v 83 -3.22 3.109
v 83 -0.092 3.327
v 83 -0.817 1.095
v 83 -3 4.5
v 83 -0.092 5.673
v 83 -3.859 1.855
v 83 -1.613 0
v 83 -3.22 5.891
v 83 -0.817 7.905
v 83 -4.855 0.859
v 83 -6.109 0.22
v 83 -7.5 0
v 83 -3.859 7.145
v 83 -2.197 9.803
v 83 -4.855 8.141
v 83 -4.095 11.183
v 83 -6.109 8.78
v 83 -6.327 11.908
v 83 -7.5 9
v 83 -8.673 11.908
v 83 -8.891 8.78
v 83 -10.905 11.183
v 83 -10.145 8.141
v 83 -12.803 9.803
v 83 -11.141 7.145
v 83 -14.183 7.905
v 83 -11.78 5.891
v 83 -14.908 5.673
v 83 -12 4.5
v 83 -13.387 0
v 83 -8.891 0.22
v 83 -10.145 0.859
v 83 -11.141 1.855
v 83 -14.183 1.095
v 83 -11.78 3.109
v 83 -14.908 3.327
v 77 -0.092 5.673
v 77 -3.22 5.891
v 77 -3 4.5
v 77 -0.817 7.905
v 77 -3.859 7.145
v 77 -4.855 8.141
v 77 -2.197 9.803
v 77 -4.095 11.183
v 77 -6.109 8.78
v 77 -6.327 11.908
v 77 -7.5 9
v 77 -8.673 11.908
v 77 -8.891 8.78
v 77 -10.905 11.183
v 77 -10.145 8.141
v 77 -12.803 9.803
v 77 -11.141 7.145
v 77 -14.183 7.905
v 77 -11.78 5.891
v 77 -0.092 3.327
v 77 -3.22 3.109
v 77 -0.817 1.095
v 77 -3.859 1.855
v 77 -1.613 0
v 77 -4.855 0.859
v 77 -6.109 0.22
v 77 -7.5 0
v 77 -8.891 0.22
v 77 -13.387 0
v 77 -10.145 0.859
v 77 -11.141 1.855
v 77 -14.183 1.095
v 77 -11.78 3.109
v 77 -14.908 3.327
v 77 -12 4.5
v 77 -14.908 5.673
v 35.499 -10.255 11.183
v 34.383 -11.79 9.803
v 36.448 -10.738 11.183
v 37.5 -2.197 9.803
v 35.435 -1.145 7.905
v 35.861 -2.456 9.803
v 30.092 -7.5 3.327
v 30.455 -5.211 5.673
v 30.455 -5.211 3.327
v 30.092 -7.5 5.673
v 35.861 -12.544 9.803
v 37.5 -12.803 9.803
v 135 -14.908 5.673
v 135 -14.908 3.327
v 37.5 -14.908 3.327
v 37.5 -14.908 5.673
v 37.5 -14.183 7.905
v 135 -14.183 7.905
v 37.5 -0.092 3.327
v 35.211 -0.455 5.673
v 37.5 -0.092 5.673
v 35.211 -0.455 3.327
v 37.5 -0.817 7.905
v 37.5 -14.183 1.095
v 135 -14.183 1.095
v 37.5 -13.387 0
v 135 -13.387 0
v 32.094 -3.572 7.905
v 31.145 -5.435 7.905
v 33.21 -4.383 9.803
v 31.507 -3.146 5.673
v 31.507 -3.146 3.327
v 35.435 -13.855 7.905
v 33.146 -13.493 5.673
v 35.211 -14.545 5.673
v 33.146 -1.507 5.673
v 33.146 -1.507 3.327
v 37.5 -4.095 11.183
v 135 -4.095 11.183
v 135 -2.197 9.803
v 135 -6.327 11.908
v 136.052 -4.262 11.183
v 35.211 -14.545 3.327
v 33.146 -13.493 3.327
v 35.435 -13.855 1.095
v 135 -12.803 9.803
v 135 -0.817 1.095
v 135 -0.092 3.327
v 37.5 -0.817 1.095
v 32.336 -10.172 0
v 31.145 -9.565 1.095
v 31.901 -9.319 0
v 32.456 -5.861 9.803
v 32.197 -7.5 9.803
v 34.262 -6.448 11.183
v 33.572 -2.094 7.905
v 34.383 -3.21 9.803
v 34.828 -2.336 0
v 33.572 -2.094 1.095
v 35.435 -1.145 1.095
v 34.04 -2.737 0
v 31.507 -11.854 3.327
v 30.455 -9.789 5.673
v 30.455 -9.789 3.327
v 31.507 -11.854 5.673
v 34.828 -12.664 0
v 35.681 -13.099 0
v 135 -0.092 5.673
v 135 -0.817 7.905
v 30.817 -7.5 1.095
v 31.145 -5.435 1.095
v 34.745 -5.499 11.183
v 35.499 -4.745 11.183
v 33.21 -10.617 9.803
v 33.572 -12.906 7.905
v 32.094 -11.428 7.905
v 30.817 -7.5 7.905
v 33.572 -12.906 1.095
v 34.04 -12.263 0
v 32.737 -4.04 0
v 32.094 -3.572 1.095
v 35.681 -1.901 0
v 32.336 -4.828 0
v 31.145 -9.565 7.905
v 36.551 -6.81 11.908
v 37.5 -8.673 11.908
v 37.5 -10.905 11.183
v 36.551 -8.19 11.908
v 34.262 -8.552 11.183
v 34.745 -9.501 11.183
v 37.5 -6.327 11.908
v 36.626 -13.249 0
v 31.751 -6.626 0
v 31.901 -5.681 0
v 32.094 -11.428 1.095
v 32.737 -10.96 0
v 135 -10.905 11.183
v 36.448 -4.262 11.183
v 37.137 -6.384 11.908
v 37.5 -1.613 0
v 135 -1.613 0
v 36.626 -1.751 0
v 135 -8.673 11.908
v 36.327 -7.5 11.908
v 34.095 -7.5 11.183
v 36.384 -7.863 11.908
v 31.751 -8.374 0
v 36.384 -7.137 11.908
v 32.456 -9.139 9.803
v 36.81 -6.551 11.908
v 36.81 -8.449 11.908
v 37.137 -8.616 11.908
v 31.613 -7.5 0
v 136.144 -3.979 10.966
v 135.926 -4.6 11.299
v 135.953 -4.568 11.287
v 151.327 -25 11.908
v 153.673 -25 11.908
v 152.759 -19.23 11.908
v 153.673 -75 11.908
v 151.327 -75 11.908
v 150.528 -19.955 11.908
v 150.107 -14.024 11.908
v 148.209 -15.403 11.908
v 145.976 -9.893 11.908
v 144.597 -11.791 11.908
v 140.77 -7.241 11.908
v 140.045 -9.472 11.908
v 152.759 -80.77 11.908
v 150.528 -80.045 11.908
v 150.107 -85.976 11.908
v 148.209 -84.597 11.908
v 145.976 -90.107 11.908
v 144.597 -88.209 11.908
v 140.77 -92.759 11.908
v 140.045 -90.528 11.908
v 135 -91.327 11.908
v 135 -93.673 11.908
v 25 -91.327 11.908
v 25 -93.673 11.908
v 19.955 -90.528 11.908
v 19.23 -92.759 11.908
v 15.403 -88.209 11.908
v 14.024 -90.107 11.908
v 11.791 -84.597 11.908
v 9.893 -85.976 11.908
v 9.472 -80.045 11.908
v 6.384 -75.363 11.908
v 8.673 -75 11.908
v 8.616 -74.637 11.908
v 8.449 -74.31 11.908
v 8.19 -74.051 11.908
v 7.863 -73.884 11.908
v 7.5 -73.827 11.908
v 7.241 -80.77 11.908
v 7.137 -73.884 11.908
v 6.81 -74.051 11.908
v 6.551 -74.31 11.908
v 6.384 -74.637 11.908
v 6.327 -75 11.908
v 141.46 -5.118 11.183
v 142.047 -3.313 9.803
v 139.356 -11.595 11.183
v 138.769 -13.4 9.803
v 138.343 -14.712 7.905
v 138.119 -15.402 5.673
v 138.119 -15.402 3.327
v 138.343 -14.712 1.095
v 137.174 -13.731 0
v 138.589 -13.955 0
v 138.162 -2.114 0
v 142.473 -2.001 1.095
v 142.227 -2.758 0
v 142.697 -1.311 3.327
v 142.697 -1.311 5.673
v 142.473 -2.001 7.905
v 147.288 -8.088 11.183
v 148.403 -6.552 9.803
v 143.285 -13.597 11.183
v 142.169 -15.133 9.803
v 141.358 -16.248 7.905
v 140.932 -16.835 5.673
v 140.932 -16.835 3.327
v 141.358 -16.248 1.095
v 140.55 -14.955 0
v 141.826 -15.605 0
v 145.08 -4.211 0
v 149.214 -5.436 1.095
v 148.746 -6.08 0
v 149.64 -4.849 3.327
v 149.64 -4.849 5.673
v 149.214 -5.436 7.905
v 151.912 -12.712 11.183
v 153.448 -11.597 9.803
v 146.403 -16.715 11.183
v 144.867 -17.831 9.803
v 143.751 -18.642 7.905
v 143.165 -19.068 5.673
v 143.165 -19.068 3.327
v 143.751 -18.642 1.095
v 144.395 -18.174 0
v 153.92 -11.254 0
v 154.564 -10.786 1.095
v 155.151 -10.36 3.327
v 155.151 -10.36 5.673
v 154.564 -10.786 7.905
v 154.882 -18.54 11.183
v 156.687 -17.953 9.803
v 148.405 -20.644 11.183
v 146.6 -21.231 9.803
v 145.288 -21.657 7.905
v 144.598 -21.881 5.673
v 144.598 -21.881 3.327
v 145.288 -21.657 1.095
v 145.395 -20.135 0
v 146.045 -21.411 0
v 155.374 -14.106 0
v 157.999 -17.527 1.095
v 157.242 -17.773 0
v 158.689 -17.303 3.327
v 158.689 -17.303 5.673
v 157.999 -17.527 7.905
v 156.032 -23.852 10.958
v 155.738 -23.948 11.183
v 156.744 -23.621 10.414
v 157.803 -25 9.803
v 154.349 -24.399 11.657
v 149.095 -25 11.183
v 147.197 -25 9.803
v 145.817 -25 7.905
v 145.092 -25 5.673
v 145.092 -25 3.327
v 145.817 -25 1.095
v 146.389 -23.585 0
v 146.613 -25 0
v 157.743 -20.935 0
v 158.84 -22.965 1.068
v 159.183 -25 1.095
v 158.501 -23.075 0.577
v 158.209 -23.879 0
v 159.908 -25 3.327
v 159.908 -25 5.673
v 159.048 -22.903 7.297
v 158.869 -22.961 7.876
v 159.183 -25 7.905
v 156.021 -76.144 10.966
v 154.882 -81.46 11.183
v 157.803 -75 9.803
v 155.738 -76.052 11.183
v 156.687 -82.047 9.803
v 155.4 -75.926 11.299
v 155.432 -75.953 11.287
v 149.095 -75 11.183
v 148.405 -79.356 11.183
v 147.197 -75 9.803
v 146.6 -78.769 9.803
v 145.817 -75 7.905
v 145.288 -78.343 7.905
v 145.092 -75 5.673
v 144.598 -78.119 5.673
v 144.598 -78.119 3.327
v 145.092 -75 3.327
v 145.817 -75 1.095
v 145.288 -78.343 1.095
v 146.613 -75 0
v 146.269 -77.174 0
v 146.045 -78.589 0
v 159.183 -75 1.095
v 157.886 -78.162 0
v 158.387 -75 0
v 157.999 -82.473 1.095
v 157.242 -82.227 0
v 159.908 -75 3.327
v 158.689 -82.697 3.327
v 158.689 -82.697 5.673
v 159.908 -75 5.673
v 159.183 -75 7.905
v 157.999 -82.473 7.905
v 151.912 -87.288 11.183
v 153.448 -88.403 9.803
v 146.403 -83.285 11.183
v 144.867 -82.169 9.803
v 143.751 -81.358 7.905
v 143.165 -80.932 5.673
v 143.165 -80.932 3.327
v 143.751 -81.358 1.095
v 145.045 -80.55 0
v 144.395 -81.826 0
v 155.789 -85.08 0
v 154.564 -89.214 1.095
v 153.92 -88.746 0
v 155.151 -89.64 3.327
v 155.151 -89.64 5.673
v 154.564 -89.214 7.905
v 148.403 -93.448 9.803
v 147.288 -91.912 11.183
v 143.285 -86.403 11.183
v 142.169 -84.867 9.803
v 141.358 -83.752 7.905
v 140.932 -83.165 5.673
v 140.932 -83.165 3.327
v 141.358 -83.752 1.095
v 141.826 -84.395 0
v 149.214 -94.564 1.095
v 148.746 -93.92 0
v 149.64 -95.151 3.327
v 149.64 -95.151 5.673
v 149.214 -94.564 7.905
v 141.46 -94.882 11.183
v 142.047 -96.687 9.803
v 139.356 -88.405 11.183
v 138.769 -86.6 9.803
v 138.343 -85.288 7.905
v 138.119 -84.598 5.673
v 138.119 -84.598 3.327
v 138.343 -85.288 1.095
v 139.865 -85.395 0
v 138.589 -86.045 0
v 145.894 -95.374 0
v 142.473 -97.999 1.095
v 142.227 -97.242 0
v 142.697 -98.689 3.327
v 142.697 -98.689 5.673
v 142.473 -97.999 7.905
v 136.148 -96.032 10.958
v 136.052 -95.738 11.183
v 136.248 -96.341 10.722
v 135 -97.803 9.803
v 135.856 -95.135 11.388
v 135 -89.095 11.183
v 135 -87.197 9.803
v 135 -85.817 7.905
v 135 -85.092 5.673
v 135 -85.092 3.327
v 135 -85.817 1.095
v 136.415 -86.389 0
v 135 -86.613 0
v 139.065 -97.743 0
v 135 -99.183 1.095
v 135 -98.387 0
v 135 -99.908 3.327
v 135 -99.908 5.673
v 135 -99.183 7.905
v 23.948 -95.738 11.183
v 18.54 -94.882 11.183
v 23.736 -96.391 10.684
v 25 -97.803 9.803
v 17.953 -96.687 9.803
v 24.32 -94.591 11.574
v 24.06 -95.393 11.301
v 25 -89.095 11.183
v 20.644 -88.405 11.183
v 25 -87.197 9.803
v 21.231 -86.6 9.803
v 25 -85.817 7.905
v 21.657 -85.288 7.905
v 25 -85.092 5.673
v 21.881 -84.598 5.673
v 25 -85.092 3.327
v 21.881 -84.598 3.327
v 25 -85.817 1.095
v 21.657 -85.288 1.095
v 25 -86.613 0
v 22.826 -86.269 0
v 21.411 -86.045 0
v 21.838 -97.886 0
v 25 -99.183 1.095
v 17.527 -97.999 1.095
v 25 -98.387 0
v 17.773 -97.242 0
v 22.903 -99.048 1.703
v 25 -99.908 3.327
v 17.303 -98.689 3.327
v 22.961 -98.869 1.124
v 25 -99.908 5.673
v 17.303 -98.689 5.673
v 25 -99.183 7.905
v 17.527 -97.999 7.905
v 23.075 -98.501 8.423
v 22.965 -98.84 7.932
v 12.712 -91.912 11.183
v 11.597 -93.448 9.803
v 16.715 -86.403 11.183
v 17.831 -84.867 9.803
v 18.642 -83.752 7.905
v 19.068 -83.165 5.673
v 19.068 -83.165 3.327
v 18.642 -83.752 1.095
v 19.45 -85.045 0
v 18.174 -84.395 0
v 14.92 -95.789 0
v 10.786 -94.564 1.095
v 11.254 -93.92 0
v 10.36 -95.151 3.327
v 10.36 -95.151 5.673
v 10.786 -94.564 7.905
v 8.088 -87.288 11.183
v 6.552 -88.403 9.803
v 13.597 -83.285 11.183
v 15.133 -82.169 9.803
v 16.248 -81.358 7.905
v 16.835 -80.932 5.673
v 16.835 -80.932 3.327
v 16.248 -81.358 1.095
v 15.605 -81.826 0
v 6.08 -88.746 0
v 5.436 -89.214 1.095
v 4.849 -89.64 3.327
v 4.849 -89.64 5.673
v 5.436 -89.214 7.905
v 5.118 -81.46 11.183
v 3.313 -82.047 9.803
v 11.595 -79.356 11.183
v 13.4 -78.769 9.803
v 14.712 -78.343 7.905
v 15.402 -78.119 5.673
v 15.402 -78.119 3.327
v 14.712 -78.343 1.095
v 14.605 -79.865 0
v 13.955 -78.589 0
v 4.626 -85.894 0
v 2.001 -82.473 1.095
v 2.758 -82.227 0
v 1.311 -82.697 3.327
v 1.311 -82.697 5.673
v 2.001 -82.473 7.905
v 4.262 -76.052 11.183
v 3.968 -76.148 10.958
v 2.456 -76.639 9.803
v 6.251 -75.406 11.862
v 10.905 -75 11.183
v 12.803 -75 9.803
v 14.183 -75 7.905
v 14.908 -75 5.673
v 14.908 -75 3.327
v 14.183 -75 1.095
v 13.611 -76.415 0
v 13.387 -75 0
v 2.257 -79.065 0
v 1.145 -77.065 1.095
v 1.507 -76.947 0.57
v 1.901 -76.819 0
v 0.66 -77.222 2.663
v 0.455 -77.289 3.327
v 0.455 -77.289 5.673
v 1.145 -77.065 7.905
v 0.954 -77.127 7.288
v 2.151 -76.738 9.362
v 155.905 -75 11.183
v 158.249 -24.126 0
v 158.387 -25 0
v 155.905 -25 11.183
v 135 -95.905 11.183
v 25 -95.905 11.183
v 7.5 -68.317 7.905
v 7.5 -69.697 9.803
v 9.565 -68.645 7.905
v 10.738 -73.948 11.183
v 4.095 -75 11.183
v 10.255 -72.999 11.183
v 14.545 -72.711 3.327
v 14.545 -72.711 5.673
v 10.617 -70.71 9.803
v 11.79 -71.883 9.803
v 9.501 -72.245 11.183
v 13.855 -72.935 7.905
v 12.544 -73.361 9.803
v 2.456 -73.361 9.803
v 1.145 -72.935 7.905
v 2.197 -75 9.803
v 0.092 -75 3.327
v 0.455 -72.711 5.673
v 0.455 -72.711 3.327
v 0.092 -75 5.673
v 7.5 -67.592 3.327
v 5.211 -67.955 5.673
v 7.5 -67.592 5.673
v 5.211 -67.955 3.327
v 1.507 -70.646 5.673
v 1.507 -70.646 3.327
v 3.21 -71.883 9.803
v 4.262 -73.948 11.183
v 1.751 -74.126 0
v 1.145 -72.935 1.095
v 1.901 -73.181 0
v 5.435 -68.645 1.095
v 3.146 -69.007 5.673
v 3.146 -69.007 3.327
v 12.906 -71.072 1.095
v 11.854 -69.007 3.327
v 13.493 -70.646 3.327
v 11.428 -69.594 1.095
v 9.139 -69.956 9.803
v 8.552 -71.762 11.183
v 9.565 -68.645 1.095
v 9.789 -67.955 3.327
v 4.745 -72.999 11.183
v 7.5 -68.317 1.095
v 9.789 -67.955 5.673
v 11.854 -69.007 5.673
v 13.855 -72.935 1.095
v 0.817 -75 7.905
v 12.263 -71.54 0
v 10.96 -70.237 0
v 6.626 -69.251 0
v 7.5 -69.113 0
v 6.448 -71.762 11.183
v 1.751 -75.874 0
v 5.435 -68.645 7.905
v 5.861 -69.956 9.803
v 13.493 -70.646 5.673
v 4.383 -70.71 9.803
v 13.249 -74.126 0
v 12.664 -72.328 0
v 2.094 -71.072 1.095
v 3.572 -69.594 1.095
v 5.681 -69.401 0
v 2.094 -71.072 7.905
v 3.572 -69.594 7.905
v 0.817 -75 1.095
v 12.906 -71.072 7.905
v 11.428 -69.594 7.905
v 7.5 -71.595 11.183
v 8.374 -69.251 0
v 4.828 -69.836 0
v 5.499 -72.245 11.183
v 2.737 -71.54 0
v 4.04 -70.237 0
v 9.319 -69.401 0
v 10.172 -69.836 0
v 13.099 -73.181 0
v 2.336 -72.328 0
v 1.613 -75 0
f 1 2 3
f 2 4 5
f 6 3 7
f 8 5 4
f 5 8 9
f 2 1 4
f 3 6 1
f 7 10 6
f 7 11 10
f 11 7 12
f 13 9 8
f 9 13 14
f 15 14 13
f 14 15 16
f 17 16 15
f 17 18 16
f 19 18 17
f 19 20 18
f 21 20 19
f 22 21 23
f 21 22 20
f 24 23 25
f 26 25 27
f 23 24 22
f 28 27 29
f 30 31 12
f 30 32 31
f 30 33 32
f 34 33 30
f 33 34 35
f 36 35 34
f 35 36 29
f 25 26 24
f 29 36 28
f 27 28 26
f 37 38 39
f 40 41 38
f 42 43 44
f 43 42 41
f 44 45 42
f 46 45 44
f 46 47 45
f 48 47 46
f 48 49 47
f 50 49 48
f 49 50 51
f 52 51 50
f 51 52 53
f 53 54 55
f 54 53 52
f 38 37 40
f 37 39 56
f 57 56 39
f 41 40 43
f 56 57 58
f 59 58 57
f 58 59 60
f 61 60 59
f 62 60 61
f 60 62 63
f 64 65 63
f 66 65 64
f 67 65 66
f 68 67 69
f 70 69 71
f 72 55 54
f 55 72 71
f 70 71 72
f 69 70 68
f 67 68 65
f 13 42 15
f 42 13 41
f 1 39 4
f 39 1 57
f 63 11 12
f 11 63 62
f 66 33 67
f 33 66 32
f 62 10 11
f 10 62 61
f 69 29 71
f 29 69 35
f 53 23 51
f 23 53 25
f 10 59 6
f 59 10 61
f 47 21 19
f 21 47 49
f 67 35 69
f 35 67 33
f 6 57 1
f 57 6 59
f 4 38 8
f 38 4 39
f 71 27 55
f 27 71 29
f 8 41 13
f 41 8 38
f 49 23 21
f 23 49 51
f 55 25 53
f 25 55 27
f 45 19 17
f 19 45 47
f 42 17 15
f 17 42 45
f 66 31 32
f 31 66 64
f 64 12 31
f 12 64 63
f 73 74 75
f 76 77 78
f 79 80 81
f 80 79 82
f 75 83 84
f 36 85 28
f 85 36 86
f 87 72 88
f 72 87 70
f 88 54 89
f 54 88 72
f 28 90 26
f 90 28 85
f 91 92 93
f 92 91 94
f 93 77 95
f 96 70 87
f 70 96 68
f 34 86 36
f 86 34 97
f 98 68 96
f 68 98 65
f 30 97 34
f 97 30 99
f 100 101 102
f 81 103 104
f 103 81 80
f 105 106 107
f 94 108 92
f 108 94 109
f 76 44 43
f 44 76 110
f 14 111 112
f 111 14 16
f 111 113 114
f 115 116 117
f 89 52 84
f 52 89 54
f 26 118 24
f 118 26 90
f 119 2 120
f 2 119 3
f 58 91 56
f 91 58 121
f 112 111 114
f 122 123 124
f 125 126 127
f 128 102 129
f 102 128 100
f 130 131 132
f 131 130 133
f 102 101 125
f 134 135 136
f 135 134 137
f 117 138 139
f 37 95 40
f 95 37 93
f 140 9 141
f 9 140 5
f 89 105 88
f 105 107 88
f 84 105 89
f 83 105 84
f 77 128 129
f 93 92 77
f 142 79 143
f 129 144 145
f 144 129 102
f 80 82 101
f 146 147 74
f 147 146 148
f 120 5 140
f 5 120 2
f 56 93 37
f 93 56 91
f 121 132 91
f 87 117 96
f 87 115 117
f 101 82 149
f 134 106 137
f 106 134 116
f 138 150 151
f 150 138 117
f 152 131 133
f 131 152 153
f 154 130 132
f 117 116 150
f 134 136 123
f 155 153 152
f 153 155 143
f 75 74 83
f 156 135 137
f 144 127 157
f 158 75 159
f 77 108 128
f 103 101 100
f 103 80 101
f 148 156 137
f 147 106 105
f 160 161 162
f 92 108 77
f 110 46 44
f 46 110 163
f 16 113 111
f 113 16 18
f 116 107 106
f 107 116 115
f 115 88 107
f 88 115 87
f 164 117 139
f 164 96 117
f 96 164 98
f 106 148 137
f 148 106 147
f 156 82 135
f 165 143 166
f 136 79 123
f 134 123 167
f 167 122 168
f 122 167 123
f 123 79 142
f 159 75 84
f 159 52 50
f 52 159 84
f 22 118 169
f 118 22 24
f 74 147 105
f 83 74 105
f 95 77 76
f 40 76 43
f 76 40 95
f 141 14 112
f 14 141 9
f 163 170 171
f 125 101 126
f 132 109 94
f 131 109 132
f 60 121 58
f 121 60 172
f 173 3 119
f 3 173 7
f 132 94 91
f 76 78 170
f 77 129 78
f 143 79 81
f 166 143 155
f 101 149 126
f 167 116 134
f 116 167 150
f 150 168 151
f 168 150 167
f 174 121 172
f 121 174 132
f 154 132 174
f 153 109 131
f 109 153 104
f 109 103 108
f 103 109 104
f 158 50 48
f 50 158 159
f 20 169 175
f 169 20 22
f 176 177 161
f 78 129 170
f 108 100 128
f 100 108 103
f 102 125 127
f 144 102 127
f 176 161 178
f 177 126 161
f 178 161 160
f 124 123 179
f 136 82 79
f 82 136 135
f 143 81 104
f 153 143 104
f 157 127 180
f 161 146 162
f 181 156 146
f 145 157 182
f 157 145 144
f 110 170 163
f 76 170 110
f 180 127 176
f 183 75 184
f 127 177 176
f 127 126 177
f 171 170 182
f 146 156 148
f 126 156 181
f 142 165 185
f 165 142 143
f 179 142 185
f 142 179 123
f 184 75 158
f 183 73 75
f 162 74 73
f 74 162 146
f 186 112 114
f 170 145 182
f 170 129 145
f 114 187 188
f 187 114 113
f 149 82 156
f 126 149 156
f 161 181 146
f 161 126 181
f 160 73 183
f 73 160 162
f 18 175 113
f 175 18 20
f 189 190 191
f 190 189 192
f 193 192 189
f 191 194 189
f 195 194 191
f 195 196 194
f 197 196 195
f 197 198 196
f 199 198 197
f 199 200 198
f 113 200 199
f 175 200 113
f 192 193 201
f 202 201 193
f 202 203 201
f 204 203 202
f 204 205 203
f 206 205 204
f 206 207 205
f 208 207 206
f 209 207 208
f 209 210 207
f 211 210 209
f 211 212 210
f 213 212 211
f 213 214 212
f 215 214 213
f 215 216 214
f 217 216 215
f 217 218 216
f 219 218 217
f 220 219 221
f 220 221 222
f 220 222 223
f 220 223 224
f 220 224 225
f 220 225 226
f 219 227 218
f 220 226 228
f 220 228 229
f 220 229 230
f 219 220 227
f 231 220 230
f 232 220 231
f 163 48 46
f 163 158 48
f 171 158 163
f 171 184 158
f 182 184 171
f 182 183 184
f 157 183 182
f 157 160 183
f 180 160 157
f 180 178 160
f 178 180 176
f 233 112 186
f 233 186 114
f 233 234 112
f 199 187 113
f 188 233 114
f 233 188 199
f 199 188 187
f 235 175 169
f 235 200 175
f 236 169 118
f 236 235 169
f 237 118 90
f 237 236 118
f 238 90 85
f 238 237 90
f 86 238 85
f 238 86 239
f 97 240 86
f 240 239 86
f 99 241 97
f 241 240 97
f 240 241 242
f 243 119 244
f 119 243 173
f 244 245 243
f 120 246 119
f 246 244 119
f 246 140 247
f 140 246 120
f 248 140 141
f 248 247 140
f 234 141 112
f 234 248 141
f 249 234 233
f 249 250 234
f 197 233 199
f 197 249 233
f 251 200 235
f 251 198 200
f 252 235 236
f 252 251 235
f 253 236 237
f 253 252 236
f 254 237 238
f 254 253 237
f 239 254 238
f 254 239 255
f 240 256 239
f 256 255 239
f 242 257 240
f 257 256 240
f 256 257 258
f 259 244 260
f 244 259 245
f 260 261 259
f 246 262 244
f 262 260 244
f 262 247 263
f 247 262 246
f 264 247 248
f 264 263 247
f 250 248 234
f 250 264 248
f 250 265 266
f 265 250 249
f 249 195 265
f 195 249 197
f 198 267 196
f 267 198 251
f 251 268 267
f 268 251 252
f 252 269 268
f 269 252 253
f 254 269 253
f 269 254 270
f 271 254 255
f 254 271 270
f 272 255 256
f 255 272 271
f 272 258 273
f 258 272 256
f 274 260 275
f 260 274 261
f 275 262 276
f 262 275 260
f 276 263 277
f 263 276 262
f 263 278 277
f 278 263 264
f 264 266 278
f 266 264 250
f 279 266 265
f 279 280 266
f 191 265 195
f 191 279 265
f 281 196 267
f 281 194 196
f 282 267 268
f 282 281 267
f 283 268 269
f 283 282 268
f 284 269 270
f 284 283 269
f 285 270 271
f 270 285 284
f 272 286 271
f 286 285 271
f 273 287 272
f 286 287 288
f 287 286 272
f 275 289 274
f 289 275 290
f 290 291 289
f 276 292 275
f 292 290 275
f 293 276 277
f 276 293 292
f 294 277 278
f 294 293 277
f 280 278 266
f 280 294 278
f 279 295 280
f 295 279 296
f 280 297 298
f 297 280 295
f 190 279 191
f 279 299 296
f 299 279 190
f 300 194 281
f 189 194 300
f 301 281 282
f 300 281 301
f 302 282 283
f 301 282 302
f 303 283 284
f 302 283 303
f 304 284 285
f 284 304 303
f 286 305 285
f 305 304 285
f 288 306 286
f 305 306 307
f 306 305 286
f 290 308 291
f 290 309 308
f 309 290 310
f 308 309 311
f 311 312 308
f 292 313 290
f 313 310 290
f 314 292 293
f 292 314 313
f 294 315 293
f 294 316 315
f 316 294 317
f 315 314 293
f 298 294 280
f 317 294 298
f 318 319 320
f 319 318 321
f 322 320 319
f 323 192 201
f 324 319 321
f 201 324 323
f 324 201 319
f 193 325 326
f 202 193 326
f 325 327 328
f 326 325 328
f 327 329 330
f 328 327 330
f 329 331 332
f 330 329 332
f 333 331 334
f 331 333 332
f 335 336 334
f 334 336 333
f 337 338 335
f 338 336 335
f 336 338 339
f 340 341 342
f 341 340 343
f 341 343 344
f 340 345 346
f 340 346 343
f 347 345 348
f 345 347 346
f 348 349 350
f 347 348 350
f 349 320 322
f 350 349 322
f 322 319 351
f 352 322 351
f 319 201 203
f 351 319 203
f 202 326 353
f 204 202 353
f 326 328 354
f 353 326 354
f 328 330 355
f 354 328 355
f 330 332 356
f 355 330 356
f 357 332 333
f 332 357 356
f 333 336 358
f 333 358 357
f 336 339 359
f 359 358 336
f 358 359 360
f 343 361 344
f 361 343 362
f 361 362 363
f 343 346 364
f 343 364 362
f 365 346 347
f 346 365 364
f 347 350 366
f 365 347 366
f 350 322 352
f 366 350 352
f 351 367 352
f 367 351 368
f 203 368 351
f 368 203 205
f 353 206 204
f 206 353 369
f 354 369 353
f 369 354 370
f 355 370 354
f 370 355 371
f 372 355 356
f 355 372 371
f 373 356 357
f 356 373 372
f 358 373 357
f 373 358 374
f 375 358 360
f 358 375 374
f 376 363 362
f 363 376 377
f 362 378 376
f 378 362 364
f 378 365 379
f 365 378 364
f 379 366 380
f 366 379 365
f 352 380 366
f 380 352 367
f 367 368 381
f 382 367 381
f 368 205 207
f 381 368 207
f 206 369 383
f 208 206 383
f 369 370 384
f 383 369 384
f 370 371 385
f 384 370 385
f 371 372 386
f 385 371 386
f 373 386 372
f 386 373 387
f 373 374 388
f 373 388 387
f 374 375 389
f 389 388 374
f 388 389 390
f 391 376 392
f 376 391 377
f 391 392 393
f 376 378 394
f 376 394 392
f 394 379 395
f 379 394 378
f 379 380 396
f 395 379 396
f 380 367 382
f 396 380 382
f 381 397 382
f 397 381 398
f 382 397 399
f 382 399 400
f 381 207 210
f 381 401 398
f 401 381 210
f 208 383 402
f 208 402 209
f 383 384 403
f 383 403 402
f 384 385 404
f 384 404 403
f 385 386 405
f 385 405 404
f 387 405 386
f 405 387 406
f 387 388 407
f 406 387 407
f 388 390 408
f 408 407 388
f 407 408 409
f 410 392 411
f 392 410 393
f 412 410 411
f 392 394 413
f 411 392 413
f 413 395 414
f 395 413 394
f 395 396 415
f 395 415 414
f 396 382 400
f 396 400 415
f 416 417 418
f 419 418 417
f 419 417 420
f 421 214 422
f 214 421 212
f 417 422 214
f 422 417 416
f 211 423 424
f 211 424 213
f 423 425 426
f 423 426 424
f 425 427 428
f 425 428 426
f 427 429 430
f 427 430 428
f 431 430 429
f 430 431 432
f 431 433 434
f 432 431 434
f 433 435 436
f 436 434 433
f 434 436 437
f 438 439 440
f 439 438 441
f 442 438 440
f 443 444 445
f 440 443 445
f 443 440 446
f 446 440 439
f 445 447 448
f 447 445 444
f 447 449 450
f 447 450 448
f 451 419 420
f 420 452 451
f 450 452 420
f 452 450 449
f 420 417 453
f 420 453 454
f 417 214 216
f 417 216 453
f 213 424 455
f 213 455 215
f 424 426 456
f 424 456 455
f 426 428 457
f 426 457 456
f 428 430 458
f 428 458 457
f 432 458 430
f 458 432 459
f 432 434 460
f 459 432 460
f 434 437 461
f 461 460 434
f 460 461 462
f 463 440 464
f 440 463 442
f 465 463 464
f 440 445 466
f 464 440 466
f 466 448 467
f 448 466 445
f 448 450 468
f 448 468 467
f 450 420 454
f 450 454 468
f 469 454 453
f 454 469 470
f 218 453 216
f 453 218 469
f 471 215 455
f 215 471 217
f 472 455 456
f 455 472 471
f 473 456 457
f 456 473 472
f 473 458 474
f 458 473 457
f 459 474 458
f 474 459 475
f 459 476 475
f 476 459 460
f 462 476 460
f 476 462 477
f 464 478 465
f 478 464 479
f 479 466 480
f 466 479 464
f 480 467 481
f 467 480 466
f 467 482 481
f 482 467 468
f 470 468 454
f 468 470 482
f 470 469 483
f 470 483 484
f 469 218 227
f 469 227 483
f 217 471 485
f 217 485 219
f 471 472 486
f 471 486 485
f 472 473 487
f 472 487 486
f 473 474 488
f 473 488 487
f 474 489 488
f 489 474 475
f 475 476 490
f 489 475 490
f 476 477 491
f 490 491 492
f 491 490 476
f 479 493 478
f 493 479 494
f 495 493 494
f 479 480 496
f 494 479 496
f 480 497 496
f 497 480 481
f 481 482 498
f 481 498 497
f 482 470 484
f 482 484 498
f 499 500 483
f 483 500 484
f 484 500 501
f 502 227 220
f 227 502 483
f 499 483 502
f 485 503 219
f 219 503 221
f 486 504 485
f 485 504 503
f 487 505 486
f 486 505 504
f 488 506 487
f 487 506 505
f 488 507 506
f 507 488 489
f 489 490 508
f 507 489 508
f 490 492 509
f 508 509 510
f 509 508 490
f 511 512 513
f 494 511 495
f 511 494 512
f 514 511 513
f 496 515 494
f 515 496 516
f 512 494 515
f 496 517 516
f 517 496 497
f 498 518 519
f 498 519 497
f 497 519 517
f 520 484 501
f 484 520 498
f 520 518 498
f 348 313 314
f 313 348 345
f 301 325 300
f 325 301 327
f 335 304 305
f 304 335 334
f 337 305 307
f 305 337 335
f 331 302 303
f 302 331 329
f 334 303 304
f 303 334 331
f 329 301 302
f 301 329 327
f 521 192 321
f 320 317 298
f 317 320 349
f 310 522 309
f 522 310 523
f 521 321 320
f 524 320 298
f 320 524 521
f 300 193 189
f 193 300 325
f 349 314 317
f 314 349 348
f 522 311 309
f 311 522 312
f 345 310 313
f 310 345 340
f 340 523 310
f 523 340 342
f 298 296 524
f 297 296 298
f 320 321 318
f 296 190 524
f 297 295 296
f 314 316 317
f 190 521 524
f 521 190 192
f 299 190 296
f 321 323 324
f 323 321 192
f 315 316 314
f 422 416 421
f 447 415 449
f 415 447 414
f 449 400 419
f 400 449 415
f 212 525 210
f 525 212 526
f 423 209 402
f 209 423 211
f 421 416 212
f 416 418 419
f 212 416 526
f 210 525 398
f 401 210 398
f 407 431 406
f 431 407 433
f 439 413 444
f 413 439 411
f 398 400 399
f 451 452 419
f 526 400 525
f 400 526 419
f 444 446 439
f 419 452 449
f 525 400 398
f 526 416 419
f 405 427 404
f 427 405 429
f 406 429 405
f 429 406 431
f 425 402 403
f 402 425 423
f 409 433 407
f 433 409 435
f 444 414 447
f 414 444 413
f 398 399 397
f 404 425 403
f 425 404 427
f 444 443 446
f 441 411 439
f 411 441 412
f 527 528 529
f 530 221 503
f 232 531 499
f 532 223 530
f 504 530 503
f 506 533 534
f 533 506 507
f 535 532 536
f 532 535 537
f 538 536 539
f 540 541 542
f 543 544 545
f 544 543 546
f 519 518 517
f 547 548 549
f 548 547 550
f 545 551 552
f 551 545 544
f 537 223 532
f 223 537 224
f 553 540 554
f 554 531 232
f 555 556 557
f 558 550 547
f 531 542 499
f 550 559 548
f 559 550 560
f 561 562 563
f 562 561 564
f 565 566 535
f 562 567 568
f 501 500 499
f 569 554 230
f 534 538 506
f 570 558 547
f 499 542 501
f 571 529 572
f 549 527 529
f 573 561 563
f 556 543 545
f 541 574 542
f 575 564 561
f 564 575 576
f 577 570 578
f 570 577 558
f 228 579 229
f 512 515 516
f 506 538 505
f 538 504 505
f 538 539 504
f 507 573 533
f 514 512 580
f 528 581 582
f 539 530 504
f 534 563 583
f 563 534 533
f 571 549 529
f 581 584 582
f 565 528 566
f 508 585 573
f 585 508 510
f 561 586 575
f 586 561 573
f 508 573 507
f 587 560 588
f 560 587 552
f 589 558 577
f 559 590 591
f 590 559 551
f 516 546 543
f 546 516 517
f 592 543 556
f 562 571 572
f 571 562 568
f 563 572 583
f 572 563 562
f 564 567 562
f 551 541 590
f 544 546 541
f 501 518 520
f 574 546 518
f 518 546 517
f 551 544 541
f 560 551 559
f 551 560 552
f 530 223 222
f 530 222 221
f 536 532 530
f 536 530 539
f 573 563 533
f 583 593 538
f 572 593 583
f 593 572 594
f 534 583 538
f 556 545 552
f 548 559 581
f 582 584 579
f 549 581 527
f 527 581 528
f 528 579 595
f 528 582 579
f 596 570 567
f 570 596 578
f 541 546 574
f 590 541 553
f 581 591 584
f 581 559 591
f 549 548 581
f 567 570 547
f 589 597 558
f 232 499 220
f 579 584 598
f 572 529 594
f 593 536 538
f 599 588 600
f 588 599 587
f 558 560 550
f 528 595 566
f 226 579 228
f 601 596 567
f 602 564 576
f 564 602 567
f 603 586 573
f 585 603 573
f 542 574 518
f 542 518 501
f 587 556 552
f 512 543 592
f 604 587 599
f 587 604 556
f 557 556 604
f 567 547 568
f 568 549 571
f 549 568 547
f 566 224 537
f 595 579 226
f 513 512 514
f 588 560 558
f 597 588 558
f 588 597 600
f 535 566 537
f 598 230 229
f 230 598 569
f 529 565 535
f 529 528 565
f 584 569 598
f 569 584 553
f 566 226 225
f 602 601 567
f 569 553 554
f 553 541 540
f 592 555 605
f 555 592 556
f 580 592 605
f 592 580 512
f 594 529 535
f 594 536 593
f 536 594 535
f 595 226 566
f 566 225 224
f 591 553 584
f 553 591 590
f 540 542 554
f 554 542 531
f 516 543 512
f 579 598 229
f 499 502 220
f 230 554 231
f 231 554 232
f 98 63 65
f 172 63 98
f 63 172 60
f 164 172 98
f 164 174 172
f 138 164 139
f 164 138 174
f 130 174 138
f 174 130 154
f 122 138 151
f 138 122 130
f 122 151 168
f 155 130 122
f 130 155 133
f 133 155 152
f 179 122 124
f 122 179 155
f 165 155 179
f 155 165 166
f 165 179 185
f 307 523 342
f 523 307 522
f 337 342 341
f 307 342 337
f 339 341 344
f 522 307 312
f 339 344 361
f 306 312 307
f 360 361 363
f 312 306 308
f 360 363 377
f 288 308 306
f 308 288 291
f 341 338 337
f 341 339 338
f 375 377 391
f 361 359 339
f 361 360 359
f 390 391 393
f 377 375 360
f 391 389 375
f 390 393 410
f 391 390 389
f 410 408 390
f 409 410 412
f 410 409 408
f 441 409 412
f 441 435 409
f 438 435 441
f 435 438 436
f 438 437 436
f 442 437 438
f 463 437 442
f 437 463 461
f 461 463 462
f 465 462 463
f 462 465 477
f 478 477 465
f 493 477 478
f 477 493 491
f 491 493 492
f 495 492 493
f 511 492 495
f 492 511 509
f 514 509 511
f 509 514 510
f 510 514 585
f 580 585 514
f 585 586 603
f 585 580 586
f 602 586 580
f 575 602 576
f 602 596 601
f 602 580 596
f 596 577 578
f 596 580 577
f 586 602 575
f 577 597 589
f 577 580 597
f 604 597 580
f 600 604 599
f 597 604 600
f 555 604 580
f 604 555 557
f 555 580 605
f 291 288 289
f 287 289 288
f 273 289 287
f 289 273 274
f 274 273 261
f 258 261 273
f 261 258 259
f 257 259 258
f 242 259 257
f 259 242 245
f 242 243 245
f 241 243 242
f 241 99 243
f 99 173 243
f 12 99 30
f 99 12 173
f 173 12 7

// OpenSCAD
/*
Toilet paper holder by Jkk79.
It started as a copy of something I have on my bathroom's wall and then expanded into fully customizable thing.
Well, originally, I broke the arm on the one I have and decided to print a replacement arm (it would have been faster and perhaps cheaper to just go and buy a new one), and then I thought that It would be cool to make the whole thing, but the holder part would be impossible to print with the original locking mechanism, at least without support structures, so I had to make my own design.
*/


//
part=1;//[1:Arm,2:Holder]
//Higher quality takes longer time to render and creates a bigger file. 60 is good enough already. 20 is good for preview.
quality=20;//[20,28,36,44,52,60,68,76,84,92,100]
/*[Arm settings]*/
orientation=0;//[0:Left,1:Right]
//
armDiameter=15; 
//
armWidth=160;
//
armHeight=100;
//The inner diameter of the corners in the arm.
armCorner=10;//[0:30]
//This is to make the printing easier. Also doubles as a part of the arm's locking mechanism.
armBottomCutDepth=3;//[2,3,4]
//Width of the notch that locks the arm into it's place. It's counterpart in the holder will be 2mm smaller.
armLockMechanismWidth=6;
/*[Holder settings]*/
//
wallPartWidth=100;
//
wallPartHeight=65;
//Default 4. Thinner than 4 might make the loop that holds the arm too weak.Thicker than 4 seems excessive.
wallPartThickness=4;//[3.0:0.5:8.0]
//The width of the loop that holds the arm.
holderWidth=65;
//Screw placement options
screwPlacements=1;//[0:No screws.1:Sides,2:Corners;3:Top and bottom]
//The diameter of the holes for screws. 
//
screwDistanceFromEdge=10;
//
screwHoleSize=3.2;
//
screwEndSinkAngle=50;
//The depth for the previous setting.
screwEndSinkDepth=2;
//Due to the inaccuracies in printing among other things, the hole for the arm needs to be slightly bigger than the arm itself.
extraSpaceForArm=0.4;

armBendLength=armCorner+armDiameter;
print_part();

module print_part(){
    if(part==1){
        mirror([orientation,0,0])arm();
    }else{
        wallPart();
    }
}

module donut(innerDiameter,donutDiameter){
    rotate_extrude(convexity=10,$fn=quality)translate([innerDiameter+donutDiameter/2,0,0])rotate([0,0,45])circle(r=donutDiameter/2,$fn=quality);
    }
    
module armBend(){
    translate([-(armCorner+armDiameter/2),0,0]){
        difference(){
            donut(armCorner,armDiameter);
            translate([-(armDiameter+armCorner+1),0,-armDiameter/2-1])cube([(armDiameter+armCorner)*2+2,armDiameter+armCorner+1,armDiameter+2]);
            translate([-(armDiameter+armCorner+1),-(armDiameter+armCorner+1),-armDiameter/2-1])cube([(armDiameter+armCorner)+1,armDiameter+armCorner+2,armDiameter+2]);
            }
      }
}

module armPart(length){
hull(){
        translate([0,0,0])sphere(r=armDiameter/2,$fn=quality);
        translate([length,0,0])sphere(r=armDiameter/2,$fn=quality);
}
    }

module armLockCut(){
    difference(){
        translate([0,-armDiameter/2,-armDiameter/2])cube([armLockMechanismWidth,armDiameter,armDiameter]);
        translate([0,0,0])rotate([0,90,0])cylinder(armLockMechanismWidth,armDiameter/2-armBottomCutDepth,armDiameter/2-armBottomCutDepth,$fn=quality);
    }
}
 
module arm(){
    difference(){
        union(){
            translate([0,-armDiameter/2,armDiameter/2-armBottomCutDepth]){
                if((armWidth-2*armBendLength)/2<holderWidth/2){
                    echo(armBendLength);
                    difference(){
                        translate([armBendLength+armWidth-armBendLength*2,0,0])armPart(-(wallPartWidth-armDiameter/2-(wallPartWidth-holderWidth)/2+2));
                        translate([armWidth-armBendLength-armLockMechanismWidth/2-wallPartWidth/2+(wallPartWidth-holderWidth)/2-2,0,0])armLockCut();
                    }
                }else{
                    difference(){
                        
                        translate([armBendLength+armWidth-armBendLength*2,0,0])armPart(-(armWidth/2-armBendLength+wallPartWidth/2-armDiameter/2));
                        translate([armWidth/2-armLockMechanismWidth/2,0,0])armLockCut();
                    }
                }
                translate([armWidth-armBendLength,0,0])rotate([0,0,90])armBend();
                translate([armWidth-armDiameter/2,-armCorner-armDiameter/2,0])rotate([0,0,-90])armPart(armHeight-2*armBendLength);
                translate([armWidth-armDiameter/2,-armHeight+armBendLength+armDiameter/2,0])rotate([0,0,0])armBend();
                translate([armBendLength,-armHeight+armDiameter,0])rotate([0,0,0])armPart(armWidth-armBendLength*2);
                translate([armBendLength,-armHeight+armDiameter,0])rotate([0,0,-90])armBend();
                translate([armDiameter/2,-armHeight+armBendLength+armDiameter/2,0])sphere(r=armDiameter/2,$fn=quality);
            }
        } 
        translate([0,-armHeight,-50])cube([armWidth,armHeight,50]);
    }  
}


module holderFillet(){
    difference(){
        cube([holderWidth,wallPartThickness,wallPartThickness]);
        translate([-1,wallPartThickness,wallPartThickness])rotate([0,90,0])cylinder(holderWidth+2,wallPartThickness,wallPartThickness,$fn=quality);
    }
}

module screwHole(){
    translate([0,0,-1])rotate([0,0,0])cylinder(wallPartThickness+2,screwHoleSize/2,screwHoleSize/2,$fn=quality);
    translate([0,0,wallPartThickness-screwEndSinkDepth])rotate([0,0,0])cylinder(wallPartThickness/2+1,screwHoleSize/2,tan(screwEndSinkAngle)*wallPartThickness/2+screwHoleSize/2,$fn=quality);
}

module wallPart(){
    difference(){
        union(){
            hull(){
                translate([wallPartThickness,wallPartThickness,0])sphere(r=wallPartThickness,$fn=quality);
                translate([wallPartWidth-wallPartThickness,wallPartThickness,0])sphere(r=wallPartThickness,$fn=quality);
                translate([wallPartThickness,wallPartHeight-wallPartThickness,0])sphere(r=wallPartThickness,$fn=quality);
                translate([wallPartWidth-wallPartThickness,wallPartHeight-wallPartThickness,0])sphere(r=wallPartThickness,$fn=quality);
            }
            hull(){
                translate([wallPartWidth/2-holderWidth/2,wallPartHeight/2,armDiameter/2+wallPartThickness])rotate([0,90,0])cylinder(holderWidth,armDiameter/2+wallPartThickness,armDiameter/2+wallPartThickness,$fn=quality);
                translate([wallPartWidth/2-holderWidth/2,wallPartHeight/2,-armDiameter/2])rotate([0,90,0])cylinder(holderWidth,armDiameter/2+wallPartThickness,armDiameter/2+wallPartThickness,$fn=quality);
            }
            translate([wallPartWidth/2-holderWidth/2,wallPartHeight/2+armDiameter/2+wallPartThickness,wallPartThickness])rotate([0,0,0])holderFillet();
            translate([wallPartWidth/2-holderWidth/2,wallPartHeight/2-armDiameter/2-wallPartThickness,wallPartThickness])rotate([90,0,0])holderFillet();
        }
        translate([-1,-1,-100])cube([wallPartWidth+2,wallPartHeight+2,100]);
        difference(){
            hull(){
                    translate([wallPartWidth/2-holderWidth/2-0.001,wallPartHeight/2,armDiameter/2+wallPartThickness])rotate([0,90,0])cylinder(holderWidth+0.002,armDiameter/2+extraSpaceForArm/2,armDiameter/2+extraSpaceForArm/2,$fn=quality);
                    translate([wallPartWidth/2-holderWidth/2,wallPartHeight/2,-armDiameter/2])rotate([0,90,0])cylinder(holderWidth,armDiameter/2+extraSpaceForArm/2,armDiameter/2+extraSpaceForArm/2,$fn=quality);
            }
            translate([wallPartWidth/2-armLockMechanismWidth/2,wallPartHeight/2-armDiameter/2-1,0])cube([armLockMechanismWidth-2,armBottomCutDepth+1-extraSpaceForArm,armDiameter*2]);    
        }
        if(screwPlacements==0){
            
        }else if(screwPlacements==1){
            translate([screwDistanceFromEdge,wallPartHeight/2,0])screwHole();
            translate([wallPartWidth-screwDistanceFromEdge,wallPartHeight/2,0])screwHole();
        }else if(screwPlacements==2){
            translate([screwDistanceFromEdge,wallPartHeight-screwDistanceFromEdge,0])screwHole();
            translate([wallPartWidth-screwDistanceFromEdge,wallPartHeight-screwDistanceFromEdge,0])screwHole();
            translate([screwDistanceFromEdge,screwDistanceFromEdge,0])screwHole();
            translate([wallPartWidth-screwDistanceFromEdge,screwDistanceFromEdge,0])screwHole();
        
        }else if(screwPlacements==3){
            translate([wallPartWidth/2,screwDistanceFromEdge,0])screwHole();
            translate([wallPartWidth/2,wallPartHeight-screwDistanceFromEdge,0])screwHole();
        }
    }
}

